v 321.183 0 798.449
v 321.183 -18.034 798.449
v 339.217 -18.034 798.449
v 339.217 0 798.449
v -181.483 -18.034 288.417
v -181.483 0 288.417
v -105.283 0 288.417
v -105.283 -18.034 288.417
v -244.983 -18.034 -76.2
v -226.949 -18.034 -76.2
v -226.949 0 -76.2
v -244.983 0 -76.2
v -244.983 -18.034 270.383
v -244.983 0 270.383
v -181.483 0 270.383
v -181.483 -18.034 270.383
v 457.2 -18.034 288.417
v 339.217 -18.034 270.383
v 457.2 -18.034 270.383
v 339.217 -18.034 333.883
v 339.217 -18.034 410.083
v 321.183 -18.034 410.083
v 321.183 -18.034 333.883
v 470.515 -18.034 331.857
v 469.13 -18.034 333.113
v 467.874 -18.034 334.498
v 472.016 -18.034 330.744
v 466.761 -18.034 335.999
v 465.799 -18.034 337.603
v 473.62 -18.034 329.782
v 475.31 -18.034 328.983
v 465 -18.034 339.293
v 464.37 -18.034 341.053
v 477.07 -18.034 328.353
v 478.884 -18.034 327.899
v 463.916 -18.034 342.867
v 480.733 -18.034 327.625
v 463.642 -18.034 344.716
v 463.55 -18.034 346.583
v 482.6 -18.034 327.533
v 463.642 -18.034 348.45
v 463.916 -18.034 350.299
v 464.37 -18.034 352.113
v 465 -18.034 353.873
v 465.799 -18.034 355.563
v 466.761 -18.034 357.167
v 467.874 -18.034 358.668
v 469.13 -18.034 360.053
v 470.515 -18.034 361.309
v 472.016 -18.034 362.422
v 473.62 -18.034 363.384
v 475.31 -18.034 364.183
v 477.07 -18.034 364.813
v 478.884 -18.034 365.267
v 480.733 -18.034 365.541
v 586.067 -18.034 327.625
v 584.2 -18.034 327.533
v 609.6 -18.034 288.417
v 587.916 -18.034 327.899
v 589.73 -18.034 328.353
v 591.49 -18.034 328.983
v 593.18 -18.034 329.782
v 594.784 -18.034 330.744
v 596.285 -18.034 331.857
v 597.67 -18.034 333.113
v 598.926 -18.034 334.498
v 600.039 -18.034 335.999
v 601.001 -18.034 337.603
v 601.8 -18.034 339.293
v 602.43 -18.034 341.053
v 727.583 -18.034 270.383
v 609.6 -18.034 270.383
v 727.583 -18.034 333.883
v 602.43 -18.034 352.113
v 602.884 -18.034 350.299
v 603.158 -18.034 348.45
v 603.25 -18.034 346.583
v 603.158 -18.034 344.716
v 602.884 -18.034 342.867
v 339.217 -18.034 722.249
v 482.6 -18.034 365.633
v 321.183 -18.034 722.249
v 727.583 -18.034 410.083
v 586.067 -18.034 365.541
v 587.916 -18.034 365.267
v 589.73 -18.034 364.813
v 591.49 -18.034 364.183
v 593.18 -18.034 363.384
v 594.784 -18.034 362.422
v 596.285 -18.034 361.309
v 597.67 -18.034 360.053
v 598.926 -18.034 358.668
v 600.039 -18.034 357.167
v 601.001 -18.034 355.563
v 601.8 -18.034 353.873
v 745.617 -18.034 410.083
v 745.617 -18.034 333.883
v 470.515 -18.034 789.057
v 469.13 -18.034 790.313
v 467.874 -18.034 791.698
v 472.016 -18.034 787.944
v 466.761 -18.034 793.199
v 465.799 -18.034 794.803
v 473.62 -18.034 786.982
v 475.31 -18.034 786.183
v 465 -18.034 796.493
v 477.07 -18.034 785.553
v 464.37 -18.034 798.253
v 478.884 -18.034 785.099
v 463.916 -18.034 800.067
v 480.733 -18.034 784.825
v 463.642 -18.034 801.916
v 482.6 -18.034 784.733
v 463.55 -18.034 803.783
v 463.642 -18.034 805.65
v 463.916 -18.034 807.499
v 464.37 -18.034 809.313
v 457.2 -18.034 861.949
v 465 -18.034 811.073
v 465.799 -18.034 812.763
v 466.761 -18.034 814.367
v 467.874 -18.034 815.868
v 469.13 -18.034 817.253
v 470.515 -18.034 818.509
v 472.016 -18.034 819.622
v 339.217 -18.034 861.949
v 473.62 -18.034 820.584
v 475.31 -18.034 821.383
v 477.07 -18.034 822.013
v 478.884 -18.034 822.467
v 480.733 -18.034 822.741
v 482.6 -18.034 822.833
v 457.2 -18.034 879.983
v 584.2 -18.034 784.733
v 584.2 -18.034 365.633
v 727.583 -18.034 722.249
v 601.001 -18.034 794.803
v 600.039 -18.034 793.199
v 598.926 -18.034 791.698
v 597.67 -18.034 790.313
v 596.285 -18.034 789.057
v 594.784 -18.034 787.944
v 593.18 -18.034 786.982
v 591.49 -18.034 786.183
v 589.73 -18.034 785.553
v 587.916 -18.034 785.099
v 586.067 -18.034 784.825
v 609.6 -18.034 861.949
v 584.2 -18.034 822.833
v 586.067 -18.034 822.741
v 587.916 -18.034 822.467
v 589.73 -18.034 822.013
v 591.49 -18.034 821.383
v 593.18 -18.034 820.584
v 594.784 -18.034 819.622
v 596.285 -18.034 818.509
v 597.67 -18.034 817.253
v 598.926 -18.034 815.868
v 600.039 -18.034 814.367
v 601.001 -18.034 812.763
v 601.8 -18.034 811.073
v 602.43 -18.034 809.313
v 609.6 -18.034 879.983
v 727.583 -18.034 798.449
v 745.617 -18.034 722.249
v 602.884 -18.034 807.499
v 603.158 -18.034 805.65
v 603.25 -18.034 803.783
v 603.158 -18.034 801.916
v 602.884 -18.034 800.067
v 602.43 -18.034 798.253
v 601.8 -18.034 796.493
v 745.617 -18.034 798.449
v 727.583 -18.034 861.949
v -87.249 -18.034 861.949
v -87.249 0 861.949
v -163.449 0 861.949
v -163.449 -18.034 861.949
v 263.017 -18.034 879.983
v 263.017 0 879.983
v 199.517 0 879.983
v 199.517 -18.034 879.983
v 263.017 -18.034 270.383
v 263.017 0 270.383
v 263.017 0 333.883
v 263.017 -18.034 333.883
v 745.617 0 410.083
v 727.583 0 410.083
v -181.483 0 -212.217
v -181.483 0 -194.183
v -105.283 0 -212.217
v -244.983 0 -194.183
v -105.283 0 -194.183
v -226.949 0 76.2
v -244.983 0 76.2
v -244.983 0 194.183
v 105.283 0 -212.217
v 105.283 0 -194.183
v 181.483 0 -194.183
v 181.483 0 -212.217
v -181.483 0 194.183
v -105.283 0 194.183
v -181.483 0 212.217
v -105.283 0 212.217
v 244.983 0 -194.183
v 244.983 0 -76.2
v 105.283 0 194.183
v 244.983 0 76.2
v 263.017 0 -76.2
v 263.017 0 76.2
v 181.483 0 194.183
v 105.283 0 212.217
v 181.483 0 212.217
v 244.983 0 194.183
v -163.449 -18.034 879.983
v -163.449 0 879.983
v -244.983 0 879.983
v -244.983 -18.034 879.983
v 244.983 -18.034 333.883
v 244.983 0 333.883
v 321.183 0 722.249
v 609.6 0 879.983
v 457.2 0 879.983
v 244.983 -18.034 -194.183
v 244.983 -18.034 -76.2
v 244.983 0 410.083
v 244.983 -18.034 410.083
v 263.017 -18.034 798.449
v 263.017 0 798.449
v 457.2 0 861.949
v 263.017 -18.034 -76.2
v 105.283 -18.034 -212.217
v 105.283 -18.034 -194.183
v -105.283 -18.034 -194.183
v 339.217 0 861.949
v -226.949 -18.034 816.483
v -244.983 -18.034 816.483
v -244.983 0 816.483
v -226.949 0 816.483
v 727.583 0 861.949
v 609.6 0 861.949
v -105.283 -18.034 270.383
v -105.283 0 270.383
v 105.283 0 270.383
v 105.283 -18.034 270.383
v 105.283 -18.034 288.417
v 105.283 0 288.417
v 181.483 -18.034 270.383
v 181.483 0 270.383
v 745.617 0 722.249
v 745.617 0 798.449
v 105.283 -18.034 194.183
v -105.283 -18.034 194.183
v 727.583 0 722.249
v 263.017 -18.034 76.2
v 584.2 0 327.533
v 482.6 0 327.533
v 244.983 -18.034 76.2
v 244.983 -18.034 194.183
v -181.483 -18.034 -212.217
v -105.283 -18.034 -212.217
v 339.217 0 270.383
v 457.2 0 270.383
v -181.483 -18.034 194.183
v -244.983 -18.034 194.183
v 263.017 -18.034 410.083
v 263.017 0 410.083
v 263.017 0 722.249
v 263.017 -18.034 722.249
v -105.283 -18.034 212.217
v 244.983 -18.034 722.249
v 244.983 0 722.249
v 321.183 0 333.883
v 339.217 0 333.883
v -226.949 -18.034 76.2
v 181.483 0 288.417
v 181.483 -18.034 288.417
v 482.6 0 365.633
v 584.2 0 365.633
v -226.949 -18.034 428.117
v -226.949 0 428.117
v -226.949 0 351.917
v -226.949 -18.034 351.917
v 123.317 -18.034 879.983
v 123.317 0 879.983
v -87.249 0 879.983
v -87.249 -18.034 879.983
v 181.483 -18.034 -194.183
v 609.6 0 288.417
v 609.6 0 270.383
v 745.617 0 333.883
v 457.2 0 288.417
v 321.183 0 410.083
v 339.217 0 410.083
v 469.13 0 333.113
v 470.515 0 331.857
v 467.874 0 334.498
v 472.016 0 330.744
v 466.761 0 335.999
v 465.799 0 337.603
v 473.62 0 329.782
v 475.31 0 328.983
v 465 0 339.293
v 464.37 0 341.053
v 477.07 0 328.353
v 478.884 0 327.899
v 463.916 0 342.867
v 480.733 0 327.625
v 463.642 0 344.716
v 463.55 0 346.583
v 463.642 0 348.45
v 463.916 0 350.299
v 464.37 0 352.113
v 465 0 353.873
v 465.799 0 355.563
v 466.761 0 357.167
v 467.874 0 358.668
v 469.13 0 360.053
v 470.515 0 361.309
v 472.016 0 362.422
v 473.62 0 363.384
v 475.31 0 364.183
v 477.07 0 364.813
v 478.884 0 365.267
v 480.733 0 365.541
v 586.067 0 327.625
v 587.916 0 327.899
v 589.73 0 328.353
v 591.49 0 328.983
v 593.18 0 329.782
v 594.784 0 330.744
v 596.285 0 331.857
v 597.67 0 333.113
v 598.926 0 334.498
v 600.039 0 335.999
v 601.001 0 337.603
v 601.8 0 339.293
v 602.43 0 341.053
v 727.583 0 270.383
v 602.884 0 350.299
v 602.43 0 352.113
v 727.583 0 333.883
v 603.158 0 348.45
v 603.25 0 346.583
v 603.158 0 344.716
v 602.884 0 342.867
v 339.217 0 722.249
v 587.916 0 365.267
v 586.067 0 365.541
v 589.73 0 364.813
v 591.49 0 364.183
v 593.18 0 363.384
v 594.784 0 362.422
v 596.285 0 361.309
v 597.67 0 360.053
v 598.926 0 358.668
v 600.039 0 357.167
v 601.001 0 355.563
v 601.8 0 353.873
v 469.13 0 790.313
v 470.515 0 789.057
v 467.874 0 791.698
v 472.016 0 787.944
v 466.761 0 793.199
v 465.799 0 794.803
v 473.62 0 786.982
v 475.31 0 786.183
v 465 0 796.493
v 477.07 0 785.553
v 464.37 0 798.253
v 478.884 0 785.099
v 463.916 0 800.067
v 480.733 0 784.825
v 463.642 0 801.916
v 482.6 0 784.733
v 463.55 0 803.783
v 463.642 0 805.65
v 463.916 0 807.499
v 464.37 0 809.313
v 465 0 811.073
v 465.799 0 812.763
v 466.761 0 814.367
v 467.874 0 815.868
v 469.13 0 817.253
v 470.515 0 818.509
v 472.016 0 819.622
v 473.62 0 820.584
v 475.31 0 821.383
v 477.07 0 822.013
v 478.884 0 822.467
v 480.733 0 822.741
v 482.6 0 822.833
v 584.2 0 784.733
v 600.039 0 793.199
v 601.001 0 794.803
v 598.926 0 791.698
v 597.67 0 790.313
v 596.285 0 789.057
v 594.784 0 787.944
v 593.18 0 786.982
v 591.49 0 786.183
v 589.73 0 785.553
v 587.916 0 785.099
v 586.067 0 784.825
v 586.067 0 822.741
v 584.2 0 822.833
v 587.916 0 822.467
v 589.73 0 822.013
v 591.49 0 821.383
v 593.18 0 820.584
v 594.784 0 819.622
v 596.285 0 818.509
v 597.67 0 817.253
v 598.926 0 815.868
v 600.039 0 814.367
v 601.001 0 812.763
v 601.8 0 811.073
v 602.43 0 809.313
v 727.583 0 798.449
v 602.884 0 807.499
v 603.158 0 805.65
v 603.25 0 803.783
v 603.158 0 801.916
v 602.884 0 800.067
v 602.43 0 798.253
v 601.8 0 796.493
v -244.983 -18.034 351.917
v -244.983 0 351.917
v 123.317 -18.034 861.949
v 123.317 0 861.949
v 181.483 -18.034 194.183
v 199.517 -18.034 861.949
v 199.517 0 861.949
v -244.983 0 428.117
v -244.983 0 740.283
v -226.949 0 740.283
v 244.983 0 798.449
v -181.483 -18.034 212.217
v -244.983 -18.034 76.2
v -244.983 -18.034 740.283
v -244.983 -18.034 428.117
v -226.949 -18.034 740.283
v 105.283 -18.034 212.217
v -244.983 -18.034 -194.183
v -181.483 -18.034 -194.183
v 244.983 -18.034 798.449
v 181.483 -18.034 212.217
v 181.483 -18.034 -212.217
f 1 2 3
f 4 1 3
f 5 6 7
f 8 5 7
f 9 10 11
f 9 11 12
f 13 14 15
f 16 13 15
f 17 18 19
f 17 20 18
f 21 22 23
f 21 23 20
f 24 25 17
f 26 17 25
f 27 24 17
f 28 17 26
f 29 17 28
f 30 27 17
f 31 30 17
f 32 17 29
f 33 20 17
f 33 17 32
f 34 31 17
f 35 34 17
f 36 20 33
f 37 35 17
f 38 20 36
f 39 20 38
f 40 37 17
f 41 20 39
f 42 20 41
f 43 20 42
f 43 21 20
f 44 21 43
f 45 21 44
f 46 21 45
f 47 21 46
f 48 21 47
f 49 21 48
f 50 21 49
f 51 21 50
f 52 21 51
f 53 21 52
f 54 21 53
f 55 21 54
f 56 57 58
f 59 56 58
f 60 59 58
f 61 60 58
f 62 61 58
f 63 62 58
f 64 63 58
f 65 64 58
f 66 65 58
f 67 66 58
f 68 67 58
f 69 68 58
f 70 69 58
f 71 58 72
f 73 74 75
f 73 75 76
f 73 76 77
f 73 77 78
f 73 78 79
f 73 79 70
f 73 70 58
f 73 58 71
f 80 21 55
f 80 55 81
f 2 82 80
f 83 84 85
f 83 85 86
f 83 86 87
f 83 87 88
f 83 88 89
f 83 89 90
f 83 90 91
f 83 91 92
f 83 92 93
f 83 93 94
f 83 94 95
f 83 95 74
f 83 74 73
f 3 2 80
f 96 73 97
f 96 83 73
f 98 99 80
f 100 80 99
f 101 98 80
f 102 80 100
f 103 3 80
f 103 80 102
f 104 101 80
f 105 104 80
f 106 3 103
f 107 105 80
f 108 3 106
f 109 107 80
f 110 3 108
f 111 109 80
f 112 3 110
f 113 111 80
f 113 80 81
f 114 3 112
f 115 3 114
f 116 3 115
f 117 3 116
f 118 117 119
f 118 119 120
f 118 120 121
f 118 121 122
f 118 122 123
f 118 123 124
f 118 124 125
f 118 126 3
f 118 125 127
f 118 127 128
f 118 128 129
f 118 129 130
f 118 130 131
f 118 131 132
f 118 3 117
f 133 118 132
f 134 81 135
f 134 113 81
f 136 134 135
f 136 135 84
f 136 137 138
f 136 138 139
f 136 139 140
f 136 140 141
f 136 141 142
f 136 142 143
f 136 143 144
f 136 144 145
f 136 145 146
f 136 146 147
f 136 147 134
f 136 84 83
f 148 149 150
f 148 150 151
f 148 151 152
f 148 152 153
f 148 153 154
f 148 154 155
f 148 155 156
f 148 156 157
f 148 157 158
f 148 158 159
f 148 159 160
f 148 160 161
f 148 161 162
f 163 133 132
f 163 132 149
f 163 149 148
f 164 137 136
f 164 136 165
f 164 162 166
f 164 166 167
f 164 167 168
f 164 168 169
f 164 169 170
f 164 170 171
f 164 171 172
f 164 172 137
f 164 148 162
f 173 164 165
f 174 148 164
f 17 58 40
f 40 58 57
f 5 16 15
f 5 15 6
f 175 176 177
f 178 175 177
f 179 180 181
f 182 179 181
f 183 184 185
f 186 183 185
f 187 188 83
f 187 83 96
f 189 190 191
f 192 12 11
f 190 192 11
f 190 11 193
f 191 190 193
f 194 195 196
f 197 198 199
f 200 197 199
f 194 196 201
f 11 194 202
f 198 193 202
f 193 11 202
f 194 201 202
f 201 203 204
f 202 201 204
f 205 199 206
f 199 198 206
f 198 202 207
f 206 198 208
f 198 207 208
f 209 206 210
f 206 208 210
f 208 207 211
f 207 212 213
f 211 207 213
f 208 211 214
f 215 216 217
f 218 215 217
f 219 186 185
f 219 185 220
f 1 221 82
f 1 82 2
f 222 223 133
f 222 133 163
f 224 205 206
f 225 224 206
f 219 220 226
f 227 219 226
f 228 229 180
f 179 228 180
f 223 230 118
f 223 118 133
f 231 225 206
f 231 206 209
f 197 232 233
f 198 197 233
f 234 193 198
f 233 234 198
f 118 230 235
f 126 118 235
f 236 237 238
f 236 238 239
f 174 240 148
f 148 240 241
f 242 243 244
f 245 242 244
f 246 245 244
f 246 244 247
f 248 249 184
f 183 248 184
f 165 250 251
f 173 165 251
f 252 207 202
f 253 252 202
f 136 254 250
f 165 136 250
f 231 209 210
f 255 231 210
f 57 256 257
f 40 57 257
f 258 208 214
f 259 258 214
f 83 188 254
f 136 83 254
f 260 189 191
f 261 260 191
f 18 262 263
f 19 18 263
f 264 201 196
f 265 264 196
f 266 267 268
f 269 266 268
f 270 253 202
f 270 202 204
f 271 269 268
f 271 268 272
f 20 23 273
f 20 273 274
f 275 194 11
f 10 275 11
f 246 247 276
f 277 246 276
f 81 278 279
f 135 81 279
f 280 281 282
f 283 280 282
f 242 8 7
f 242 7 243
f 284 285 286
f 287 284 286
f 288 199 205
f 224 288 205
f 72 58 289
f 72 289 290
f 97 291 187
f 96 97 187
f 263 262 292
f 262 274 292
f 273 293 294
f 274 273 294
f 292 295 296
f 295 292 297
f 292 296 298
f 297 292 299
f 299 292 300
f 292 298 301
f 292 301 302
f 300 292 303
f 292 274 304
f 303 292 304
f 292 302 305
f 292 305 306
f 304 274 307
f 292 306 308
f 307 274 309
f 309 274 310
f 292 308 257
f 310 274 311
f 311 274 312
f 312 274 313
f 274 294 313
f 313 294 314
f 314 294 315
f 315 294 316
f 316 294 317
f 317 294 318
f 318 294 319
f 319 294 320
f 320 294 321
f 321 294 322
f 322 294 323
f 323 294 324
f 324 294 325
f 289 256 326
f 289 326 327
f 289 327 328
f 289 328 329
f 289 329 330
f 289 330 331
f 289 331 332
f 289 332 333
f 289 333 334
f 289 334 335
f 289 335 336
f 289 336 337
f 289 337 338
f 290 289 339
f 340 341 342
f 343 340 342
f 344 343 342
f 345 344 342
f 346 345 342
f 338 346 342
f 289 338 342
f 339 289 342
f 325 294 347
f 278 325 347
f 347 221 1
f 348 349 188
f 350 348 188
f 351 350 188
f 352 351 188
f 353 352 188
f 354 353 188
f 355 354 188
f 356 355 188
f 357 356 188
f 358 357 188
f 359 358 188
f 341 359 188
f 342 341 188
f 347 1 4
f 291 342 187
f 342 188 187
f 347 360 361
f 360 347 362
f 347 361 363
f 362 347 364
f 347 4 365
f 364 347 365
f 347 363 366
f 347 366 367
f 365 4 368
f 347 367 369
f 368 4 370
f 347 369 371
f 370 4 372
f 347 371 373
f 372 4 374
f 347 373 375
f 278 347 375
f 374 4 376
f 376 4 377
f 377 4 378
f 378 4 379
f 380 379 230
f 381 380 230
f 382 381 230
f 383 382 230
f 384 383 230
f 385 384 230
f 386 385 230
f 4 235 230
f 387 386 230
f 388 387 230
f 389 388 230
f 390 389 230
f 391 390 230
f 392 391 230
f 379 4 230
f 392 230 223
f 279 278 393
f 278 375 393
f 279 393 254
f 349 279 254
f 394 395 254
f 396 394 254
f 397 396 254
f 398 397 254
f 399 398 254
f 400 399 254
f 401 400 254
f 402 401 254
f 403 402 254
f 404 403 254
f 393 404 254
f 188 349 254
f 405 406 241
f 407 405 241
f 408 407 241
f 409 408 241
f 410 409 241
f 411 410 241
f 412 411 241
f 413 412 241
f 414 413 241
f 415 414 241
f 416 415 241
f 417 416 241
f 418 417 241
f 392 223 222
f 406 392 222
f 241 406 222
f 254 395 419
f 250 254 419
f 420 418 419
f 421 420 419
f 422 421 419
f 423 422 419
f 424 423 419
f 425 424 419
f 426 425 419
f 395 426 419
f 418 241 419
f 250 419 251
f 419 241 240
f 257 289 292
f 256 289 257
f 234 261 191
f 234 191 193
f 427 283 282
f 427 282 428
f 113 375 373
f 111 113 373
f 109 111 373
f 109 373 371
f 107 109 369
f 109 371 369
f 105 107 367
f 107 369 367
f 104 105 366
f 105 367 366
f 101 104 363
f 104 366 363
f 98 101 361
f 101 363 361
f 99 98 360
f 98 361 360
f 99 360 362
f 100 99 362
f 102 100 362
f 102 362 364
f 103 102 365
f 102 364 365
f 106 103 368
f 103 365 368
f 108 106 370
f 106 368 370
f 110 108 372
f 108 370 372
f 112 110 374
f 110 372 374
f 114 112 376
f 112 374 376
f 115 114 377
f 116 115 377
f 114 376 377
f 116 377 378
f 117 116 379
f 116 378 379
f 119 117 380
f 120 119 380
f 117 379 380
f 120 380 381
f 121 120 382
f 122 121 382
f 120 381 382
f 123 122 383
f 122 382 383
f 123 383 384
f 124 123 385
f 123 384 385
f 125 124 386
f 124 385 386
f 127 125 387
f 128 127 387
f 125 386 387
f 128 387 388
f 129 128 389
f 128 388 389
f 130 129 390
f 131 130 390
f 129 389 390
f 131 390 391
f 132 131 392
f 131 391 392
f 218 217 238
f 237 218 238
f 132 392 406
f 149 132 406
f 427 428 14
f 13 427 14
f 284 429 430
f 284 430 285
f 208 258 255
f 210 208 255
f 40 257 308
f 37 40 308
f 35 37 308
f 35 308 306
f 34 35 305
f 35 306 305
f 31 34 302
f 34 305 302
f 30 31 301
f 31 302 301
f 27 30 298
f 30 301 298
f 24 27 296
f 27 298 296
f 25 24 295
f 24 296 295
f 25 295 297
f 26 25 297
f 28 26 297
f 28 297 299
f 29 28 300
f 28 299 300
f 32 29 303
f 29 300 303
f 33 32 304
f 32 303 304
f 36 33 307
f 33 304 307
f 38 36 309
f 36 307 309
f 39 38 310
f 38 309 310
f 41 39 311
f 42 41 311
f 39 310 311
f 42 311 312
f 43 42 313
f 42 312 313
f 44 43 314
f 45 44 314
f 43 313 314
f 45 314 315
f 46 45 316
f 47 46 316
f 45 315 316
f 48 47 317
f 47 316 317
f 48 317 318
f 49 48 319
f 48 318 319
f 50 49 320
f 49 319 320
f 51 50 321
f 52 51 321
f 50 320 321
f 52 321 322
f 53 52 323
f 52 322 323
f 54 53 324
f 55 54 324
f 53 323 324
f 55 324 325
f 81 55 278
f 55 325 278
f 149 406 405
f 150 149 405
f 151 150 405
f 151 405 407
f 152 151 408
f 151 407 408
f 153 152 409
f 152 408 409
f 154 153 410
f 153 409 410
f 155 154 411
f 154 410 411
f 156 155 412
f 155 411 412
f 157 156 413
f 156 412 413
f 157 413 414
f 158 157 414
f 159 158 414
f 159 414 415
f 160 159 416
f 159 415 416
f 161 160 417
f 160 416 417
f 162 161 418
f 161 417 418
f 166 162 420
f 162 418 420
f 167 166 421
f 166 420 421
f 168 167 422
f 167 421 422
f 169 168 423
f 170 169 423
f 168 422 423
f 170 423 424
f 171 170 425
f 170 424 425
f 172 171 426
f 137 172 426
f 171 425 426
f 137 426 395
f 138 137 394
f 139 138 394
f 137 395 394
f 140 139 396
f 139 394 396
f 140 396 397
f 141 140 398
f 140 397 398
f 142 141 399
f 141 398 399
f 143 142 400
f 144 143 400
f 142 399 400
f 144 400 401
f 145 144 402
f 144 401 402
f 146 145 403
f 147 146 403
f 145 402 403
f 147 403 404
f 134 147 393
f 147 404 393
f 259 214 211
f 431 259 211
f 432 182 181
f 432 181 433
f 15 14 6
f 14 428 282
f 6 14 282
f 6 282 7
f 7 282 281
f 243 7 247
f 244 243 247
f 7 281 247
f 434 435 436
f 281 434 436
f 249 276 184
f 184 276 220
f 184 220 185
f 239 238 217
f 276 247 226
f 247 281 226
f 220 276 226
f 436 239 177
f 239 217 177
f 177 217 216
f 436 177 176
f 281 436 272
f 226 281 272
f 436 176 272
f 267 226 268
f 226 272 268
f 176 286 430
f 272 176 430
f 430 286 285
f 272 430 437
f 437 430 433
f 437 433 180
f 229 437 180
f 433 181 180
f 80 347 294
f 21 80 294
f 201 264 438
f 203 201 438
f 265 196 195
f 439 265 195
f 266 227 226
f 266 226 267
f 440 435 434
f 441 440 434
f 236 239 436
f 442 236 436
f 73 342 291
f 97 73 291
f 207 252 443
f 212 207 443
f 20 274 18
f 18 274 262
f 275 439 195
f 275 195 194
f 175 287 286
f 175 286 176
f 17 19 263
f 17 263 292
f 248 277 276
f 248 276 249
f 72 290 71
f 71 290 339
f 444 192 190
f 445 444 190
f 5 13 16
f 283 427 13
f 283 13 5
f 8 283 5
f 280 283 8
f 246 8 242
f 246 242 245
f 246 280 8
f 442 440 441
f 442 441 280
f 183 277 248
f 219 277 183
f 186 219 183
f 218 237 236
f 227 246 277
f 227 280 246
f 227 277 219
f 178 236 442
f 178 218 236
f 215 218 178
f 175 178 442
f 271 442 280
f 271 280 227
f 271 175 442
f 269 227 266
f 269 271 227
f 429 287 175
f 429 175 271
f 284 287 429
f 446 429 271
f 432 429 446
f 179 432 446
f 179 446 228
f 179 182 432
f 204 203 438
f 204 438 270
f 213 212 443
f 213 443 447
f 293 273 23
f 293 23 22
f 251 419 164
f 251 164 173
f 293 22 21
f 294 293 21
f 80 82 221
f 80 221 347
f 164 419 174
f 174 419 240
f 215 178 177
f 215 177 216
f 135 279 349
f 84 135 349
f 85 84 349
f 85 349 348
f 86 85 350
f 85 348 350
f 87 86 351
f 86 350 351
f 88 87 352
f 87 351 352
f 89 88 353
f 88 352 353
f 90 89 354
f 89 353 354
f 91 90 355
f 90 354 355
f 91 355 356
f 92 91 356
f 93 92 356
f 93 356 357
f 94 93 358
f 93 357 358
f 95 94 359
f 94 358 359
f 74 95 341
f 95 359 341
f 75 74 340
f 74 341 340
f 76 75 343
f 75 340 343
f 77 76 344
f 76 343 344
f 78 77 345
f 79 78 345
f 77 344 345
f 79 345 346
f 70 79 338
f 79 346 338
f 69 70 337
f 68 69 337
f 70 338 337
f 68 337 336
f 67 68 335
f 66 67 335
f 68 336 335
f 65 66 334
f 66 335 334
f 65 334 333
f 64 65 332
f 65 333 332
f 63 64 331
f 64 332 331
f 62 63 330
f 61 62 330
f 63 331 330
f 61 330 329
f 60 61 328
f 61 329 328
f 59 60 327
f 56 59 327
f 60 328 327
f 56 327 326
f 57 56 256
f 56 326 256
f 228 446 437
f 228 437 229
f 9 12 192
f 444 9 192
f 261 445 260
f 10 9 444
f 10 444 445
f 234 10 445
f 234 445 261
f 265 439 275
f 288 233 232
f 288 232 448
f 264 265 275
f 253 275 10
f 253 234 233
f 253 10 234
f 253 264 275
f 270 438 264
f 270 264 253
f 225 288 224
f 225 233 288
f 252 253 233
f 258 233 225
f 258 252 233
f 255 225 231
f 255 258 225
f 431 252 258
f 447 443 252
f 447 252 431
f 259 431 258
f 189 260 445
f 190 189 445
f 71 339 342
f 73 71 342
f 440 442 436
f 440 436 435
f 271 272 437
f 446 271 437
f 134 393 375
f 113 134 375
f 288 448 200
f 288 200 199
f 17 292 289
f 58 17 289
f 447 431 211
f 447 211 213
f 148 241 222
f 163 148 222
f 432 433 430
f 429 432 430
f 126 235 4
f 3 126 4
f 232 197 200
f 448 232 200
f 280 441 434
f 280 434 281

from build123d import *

# Parameters (mm, degrees)
F1_W     = 18.034
F1_H     = 152.4
F1_W_2   = 76.2
F1_H_2   = 18.034
F2_DEPTH = 18.034
F1_W_3   = 152.4
F1_H_3   = 76.2


# Not quite as in the source:
# - a variable given as a bare number and used for a length is read in inches; the dataset says mm whatever the document's units were
# - a feature names something its author has since deleted; it is built from what else it names


with BuildPart() as f2:
    # F1 (on Front) → F2 (new body)
    with BuildSketch(Plane.XZ):
        with Locations((254, 0)):
            Rectangle(F1_W, F1_H)
        with Locations((-143.383, 203.2)):
            Rectangle(F1_W_2, F1_H_2)
        with Locations((143.383, 203.2)):
            Rectangle(F1_W_2, F1_H_2)
        Polygon((-181.483, 194.183), (-244.983, 194.183), (-244.983, 76.2), (-226.949, 76.2), (-226.949, -76.2), (-244.983, -76.2), (-244.983, -194.183), (-181.483, -194.183), (-105.283, -194.183), (105.283, -194.183), (181.483, -194.183), (244.983, -194.183), (244.983, -76.2), (244.983, 76.2), (244.983, 194.183), (181.483, 194.183), (105.283, 194.183), (-105.283, 194.183), align=None)
        with Locations((-143.383, -203.2)):
            Rectangle(F1_W_2, F1_H_2)
        with Locations((143.383, -203.2)):
            Rectangle(F1_W_2, F1_H_2)
    extrude(amount=F2_DEPTH)


with BuildPart() as f2b:
    # F1 (on Front) → F2, piece 2 (new body)
    with BuildSketch(Plane.XZ):
        Polygon((-244.983, 351.917), (-244.983, 270.383), (-181.483, 270.383), (-181.483, 288.417), (-105.283, 288.417), (-105.283, 270.383), (105.283, 270.383), (105.283, 288.417), (181.483, 288.417), (181.483, 270.383), (263.017, 270.383), (263.017, 333.883), (244.983, 333.883), (244.983, 410.083), (263.017, 410.083), (263.017, 722.249), (244.983, 722.249), (244.983, 798.449), (263.017, 798.449), (263.017, 879.983), (199.517, 879.983), (199.517, 861.949), (123.317, 861.949), (123.317, 879.983), (-87.249, 879.983), (-87.249, 861.949), (-163.449, 861.949), (-163.449, 879.983), (-244.983, 879.983), (-244.983, 816.483), (-226.949, 816.483), (-226.949, 740.283), (-244.983, 740.283), (-244.983, 428.117), (-226.949, 428.117), (-226.949, 351.917), align=None)
    extrude(amount=F2_DEPTH)


with BuildPart() as f2c:
    # F1 (on Front) → F2, piece 3 (new body)
    with BuildSketch(Plane.XZ):
        Polygon((339.217, 333.883), (339.217, 270.383), (457.2, 270.383), (457.2, 288.417), (609.6, 288.417), (609.6, 270.383), (727.583, 270.383), (727.583, 333.883), (727.583, 410.083), (727.583, 722.249), (727.583, 798.449), (727.583, 861.949), (609.6, 861.949), (457.2, 861.949), (339.217, 861.949), (339.217, 798.449), (339.217, 722.249), (339.217, 410.083), align=None)
        with BuildLine():
            Line((533.4, 365.633), (584.2, 365.633))
            ThreePointArc((584.2, 365.633), (603.25, 346.583), (584.2, 327.533))
            Line((584.2, 327.533), (533.4, 327.533))
            Line((533.4, 327.533), (482.6, 327.533))
            ThreePointArc((482.6, 327.533), (463.55, 346.583), (482.6, 365.633))
            Line((482.6, 365.633), (533.4, 365.633))
        make_face(mode=Mode.SUBTRACT)
        with BuildLine():
            Line((482.6, 822.833), (533.4, 822.833))
            Line((533.4, 822.833), (584.2, 822.833))
            ThreePointArc((584.2, 822.833), (603.25, 803.783), (584.2, 784.733))
            Line((584.2, 784.733), (533.4, 784.733))
            Line((533.4, 784.733), (482.6, 784.733))
            ThreePointArc((482.6, 784.733), (463.55, 803.783), (482.6, 822.833))
        make_face(mode=Mode.SUBTRACT)
        with Locations((533.4, 870.966)):
            Rectangle(F1_W_3, F1_H_2)
        with Locations((330.2, 760.349)):
            Rectangle(F1_W, F1_H_3)
        with Locations((330.2, 371.983)):
            Rectangle(F1_W, F1_H_3)
        with Locations((736.6, 760.349)):
            Rectangle(F1_W, F1_H_3)
        with Locations((736.6, 371.983)):
            Rectangle(F1_W, F1_H_3)
    extrude(amount=F2_DEPTH)


solid = Compound([f2.part, f2b.part, f2c.part])
